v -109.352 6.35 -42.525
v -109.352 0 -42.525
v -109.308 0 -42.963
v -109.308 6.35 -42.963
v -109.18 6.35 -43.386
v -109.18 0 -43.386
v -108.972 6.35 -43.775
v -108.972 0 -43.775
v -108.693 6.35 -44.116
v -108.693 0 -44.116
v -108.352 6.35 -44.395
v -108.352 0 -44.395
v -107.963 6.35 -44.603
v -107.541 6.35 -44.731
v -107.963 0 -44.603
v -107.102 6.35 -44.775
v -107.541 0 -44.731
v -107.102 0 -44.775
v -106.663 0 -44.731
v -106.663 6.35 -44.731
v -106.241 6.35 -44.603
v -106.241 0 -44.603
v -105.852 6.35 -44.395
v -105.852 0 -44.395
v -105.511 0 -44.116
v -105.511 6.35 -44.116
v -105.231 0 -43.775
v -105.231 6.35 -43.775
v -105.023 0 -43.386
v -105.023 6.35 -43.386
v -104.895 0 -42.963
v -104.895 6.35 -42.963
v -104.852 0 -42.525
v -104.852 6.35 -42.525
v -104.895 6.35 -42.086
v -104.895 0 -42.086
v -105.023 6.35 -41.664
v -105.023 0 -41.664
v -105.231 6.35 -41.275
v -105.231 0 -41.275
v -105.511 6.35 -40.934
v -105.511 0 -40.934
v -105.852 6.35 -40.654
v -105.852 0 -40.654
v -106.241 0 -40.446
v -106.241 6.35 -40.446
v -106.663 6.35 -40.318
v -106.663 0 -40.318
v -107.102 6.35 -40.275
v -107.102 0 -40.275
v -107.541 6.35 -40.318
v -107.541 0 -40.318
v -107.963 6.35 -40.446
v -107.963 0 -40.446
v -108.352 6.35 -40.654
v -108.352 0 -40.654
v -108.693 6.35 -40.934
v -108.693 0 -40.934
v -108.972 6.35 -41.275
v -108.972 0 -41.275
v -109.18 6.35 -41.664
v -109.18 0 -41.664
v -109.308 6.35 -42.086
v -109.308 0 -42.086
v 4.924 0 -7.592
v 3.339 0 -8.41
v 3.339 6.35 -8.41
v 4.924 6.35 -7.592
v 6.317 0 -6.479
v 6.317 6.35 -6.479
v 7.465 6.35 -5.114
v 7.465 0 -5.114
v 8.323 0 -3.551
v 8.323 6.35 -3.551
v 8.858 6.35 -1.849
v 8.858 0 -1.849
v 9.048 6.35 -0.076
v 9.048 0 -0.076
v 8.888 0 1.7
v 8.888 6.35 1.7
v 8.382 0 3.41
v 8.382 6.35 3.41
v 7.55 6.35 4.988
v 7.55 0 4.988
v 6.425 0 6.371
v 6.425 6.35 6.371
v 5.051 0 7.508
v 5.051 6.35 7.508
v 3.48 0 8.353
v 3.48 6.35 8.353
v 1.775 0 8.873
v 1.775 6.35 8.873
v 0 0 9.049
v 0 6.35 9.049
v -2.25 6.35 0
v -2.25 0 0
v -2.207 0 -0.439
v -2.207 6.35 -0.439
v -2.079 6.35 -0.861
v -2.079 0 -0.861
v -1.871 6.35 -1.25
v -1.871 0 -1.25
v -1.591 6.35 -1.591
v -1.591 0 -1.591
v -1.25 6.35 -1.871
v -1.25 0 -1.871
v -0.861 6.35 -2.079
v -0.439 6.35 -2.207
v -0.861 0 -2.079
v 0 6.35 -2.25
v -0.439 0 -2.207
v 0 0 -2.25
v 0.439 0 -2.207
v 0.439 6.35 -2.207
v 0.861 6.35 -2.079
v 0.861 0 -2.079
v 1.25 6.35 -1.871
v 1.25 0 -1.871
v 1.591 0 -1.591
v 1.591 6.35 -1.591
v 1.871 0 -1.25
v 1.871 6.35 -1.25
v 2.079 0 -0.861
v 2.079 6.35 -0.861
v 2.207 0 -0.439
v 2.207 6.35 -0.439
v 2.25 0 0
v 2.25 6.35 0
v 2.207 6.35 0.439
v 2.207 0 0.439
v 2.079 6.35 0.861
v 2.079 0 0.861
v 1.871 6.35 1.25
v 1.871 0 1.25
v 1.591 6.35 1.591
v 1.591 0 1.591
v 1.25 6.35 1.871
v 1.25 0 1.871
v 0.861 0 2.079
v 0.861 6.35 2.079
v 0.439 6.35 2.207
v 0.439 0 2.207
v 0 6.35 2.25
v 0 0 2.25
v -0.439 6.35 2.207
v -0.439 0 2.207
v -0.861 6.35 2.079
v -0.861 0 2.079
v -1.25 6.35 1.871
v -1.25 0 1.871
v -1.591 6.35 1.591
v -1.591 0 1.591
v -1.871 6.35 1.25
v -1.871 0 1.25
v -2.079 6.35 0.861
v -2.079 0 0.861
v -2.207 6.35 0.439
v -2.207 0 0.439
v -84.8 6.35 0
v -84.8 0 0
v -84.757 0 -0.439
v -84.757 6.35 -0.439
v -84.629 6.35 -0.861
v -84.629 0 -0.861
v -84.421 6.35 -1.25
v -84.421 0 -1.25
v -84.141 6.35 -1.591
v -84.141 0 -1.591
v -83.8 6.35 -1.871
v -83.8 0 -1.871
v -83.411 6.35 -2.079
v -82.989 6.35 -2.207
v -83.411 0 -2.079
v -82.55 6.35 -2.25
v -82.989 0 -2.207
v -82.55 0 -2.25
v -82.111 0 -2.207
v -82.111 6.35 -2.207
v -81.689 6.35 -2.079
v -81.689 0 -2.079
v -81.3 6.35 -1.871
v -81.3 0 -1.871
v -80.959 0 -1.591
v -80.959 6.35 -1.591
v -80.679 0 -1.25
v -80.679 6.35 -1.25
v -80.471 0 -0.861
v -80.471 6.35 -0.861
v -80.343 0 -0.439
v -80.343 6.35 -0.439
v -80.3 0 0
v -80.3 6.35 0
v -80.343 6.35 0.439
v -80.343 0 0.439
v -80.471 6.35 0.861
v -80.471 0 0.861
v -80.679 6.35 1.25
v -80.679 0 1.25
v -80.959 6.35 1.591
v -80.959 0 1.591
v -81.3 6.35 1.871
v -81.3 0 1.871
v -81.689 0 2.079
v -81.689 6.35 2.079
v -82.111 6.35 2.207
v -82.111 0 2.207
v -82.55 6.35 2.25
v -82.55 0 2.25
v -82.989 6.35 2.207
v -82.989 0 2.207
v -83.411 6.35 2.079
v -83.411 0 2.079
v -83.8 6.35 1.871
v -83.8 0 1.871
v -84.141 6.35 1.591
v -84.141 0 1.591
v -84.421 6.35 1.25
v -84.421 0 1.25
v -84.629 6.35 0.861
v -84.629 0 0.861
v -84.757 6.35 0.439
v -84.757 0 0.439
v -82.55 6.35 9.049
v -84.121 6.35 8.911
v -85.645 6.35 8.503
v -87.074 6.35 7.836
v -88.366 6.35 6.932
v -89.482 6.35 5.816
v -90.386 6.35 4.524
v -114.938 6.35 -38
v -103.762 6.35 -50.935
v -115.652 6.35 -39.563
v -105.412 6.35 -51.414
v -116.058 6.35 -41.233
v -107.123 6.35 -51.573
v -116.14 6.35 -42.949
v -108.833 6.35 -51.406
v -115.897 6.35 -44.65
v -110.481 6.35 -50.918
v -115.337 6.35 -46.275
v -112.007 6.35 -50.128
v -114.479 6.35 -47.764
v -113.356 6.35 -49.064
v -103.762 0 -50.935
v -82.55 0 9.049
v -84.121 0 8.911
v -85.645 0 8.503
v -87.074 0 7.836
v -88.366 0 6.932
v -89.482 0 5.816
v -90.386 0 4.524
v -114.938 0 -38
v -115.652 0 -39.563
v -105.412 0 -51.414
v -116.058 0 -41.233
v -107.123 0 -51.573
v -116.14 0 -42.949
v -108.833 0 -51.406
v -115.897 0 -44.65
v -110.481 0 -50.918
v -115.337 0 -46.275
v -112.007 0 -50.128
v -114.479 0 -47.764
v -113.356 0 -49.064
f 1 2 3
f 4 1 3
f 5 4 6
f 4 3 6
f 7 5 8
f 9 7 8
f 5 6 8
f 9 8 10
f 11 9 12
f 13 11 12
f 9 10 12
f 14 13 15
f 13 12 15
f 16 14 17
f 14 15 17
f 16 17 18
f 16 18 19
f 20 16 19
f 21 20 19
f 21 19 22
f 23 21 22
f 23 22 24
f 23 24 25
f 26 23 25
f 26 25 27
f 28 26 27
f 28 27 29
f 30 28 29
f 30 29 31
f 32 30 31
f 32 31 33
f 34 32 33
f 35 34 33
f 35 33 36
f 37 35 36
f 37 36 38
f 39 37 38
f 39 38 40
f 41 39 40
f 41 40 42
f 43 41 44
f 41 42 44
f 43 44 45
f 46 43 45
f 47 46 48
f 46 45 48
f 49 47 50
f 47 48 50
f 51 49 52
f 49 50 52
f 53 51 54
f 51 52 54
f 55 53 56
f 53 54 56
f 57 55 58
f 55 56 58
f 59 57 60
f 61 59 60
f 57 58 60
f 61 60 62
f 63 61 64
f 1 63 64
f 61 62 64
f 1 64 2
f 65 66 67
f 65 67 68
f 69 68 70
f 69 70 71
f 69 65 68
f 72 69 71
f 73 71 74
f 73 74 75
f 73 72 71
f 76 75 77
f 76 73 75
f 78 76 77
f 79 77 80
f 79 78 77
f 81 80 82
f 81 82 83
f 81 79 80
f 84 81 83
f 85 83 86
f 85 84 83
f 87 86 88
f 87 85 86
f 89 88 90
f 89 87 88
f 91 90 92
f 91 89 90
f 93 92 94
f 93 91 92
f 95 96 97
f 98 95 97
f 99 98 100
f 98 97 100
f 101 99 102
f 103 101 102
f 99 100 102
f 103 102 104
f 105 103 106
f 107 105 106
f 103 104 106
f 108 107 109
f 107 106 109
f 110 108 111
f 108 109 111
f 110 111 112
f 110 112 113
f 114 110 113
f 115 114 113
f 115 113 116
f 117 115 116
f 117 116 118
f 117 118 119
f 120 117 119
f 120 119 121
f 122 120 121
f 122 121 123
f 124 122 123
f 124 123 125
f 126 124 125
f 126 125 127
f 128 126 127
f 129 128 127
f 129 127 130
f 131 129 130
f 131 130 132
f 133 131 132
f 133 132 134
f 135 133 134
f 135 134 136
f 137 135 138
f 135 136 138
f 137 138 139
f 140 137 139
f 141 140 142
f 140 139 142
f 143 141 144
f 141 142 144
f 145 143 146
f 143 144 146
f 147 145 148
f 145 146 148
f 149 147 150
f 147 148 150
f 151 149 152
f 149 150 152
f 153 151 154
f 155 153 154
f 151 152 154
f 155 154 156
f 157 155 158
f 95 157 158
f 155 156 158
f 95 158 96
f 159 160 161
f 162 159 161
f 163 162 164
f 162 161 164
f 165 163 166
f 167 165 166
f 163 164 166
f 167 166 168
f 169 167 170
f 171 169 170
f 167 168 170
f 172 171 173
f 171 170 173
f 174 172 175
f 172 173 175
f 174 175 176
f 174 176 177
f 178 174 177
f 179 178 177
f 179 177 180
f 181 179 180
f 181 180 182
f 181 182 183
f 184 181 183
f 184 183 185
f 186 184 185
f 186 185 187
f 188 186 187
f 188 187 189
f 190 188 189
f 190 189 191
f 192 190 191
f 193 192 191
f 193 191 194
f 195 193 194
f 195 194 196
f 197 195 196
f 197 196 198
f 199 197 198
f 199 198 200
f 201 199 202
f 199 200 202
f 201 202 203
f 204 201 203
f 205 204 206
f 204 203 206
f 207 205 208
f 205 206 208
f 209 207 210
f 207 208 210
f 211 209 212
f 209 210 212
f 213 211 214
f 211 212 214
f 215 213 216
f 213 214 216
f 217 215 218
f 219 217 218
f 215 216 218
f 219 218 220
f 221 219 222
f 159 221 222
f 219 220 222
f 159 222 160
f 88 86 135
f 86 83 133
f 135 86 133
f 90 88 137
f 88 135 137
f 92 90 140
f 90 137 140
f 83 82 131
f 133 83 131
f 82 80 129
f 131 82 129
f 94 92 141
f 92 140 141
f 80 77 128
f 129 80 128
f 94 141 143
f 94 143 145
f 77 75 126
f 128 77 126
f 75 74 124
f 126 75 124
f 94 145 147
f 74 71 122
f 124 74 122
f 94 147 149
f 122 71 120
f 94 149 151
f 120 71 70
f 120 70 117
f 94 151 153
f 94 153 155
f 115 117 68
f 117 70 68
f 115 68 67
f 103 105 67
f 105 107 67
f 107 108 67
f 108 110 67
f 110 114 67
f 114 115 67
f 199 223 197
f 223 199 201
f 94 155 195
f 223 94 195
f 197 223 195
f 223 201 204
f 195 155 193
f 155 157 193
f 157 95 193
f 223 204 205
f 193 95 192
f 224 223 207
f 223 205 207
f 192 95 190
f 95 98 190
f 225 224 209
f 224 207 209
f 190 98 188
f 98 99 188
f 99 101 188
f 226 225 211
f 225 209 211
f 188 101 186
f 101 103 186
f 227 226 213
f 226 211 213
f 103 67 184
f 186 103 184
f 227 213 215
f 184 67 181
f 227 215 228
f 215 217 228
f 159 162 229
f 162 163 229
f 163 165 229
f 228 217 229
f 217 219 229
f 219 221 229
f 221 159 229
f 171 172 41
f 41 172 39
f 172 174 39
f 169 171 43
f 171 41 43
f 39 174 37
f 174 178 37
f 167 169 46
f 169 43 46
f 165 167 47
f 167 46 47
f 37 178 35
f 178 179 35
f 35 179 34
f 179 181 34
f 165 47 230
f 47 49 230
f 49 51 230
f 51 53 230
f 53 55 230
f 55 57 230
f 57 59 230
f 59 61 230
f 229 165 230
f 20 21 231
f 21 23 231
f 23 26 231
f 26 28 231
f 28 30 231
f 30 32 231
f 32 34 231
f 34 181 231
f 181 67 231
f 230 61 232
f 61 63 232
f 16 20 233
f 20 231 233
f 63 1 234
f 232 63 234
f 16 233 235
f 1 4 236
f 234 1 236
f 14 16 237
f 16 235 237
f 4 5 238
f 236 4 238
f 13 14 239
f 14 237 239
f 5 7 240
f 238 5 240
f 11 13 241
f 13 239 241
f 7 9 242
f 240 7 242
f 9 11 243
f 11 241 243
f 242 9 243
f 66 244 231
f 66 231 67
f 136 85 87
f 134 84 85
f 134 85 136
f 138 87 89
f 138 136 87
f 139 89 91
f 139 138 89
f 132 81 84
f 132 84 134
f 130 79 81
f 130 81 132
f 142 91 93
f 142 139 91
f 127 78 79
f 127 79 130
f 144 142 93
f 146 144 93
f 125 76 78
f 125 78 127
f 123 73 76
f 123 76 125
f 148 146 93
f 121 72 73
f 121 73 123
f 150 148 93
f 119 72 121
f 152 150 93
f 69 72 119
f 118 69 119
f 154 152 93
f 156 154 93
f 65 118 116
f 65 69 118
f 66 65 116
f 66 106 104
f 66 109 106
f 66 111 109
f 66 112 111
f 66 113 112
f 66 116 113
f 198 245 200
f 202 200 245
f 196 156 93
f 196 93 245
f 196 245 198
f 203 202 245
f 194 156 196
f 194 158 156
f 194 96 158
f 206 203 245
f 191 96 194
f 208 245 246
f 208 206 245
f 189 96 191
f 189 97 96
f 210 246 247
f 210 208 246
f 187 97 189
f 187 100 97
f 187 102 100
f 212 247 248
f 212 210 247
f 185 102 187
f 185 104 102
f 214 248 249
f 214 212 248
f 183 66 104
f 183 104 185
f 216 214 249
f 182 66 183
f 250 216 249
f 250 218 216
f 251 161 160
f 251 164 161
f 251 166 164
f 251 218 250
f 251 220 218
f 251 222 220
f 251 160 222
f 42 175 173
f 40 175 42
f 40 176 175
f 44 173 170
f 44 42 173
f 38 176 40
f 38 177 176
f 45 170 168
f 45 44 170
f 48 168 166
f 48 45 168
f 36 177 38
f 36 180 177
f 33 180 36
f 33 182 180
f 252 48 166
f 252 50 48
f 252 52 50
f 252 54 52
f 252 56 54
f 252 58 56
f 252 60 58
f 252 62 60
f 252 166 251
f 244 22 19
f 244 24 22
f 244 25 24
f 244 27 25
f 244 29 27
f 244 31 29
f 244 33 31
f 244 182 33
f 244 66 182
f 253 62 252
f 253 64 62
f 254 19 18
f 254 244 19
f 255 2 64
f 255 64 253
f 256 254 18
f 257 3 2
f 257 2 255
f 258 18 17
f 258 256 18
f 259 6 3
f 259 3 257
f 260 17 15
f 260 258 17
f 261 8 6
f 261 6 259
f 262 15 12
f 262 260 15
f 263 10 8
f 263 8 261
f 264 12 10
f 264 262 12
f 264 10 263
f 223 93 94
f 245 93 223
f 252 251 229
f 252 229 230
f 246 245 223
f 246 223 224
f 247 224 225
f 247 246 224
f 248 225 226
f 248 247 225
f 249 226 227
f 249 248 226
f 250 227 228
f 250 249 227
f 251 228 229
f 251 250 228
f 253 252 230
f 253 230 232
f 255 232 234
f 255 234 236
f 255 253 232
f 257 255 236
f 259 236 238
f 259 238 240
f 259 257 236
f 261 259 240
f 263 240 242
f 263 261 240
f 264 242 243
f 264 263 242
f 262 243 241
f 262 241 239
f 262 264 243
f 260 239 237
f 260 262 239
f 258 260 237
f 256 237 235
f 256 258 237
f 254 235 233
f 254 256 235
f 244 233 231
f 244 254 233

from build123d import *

# Parameters (mm, degrees)
BOSS_EXTRUDE1_DEPTH  = 6.35
M4_CLEARANCE_HOLE1_D = 4.5


with BuildPart() as part:
    # Sketch3 → Boss-Extrude1 (new body)
    with BuildSketch(Plane(origin=(0, 0, 0), x_dir=(1, 0, 0), z_dir=(0, 1, 0))):
        with BuildLine():
            Line((-103.762341406, 50.934626006), (3.339213875, 8.410084854))
            ThreePointArc((3.339213875, 8.410084854), (8.88764963, -1.699870765), (0, -9.04875))
            Line((0, -9.04875), (-82.55, -9.04875))
            ThreePointArc((-82.55, -9.04875), (-87.074375, -7.836447372), (-90.386447372, -4.524375))
            Line((-90.386447372, -4.524375), (-114.938002654, 38.000166152))
            ThreePointArc((-114.938002654, 38.000166152), (-113.948550258, 48.440497232), (-103.762341406, 50.934626006))
        make_face()
    extrude(amount=BOSS_EXTRUDE1_DEPTH)

    # M4 Clearance Hole1 (through all)
    with Locations(Plane(origin=(0, 6.35, 0), x_dir=(1, 0, 0), z_dir=(0, 1, 0))):
        with Locations((-107.101555281, 42.524541152), (-82.55, 0), (0, 0)):
            Hole(M4_CLEARANCE_HOLE1_D / 2)


solid = part.part
